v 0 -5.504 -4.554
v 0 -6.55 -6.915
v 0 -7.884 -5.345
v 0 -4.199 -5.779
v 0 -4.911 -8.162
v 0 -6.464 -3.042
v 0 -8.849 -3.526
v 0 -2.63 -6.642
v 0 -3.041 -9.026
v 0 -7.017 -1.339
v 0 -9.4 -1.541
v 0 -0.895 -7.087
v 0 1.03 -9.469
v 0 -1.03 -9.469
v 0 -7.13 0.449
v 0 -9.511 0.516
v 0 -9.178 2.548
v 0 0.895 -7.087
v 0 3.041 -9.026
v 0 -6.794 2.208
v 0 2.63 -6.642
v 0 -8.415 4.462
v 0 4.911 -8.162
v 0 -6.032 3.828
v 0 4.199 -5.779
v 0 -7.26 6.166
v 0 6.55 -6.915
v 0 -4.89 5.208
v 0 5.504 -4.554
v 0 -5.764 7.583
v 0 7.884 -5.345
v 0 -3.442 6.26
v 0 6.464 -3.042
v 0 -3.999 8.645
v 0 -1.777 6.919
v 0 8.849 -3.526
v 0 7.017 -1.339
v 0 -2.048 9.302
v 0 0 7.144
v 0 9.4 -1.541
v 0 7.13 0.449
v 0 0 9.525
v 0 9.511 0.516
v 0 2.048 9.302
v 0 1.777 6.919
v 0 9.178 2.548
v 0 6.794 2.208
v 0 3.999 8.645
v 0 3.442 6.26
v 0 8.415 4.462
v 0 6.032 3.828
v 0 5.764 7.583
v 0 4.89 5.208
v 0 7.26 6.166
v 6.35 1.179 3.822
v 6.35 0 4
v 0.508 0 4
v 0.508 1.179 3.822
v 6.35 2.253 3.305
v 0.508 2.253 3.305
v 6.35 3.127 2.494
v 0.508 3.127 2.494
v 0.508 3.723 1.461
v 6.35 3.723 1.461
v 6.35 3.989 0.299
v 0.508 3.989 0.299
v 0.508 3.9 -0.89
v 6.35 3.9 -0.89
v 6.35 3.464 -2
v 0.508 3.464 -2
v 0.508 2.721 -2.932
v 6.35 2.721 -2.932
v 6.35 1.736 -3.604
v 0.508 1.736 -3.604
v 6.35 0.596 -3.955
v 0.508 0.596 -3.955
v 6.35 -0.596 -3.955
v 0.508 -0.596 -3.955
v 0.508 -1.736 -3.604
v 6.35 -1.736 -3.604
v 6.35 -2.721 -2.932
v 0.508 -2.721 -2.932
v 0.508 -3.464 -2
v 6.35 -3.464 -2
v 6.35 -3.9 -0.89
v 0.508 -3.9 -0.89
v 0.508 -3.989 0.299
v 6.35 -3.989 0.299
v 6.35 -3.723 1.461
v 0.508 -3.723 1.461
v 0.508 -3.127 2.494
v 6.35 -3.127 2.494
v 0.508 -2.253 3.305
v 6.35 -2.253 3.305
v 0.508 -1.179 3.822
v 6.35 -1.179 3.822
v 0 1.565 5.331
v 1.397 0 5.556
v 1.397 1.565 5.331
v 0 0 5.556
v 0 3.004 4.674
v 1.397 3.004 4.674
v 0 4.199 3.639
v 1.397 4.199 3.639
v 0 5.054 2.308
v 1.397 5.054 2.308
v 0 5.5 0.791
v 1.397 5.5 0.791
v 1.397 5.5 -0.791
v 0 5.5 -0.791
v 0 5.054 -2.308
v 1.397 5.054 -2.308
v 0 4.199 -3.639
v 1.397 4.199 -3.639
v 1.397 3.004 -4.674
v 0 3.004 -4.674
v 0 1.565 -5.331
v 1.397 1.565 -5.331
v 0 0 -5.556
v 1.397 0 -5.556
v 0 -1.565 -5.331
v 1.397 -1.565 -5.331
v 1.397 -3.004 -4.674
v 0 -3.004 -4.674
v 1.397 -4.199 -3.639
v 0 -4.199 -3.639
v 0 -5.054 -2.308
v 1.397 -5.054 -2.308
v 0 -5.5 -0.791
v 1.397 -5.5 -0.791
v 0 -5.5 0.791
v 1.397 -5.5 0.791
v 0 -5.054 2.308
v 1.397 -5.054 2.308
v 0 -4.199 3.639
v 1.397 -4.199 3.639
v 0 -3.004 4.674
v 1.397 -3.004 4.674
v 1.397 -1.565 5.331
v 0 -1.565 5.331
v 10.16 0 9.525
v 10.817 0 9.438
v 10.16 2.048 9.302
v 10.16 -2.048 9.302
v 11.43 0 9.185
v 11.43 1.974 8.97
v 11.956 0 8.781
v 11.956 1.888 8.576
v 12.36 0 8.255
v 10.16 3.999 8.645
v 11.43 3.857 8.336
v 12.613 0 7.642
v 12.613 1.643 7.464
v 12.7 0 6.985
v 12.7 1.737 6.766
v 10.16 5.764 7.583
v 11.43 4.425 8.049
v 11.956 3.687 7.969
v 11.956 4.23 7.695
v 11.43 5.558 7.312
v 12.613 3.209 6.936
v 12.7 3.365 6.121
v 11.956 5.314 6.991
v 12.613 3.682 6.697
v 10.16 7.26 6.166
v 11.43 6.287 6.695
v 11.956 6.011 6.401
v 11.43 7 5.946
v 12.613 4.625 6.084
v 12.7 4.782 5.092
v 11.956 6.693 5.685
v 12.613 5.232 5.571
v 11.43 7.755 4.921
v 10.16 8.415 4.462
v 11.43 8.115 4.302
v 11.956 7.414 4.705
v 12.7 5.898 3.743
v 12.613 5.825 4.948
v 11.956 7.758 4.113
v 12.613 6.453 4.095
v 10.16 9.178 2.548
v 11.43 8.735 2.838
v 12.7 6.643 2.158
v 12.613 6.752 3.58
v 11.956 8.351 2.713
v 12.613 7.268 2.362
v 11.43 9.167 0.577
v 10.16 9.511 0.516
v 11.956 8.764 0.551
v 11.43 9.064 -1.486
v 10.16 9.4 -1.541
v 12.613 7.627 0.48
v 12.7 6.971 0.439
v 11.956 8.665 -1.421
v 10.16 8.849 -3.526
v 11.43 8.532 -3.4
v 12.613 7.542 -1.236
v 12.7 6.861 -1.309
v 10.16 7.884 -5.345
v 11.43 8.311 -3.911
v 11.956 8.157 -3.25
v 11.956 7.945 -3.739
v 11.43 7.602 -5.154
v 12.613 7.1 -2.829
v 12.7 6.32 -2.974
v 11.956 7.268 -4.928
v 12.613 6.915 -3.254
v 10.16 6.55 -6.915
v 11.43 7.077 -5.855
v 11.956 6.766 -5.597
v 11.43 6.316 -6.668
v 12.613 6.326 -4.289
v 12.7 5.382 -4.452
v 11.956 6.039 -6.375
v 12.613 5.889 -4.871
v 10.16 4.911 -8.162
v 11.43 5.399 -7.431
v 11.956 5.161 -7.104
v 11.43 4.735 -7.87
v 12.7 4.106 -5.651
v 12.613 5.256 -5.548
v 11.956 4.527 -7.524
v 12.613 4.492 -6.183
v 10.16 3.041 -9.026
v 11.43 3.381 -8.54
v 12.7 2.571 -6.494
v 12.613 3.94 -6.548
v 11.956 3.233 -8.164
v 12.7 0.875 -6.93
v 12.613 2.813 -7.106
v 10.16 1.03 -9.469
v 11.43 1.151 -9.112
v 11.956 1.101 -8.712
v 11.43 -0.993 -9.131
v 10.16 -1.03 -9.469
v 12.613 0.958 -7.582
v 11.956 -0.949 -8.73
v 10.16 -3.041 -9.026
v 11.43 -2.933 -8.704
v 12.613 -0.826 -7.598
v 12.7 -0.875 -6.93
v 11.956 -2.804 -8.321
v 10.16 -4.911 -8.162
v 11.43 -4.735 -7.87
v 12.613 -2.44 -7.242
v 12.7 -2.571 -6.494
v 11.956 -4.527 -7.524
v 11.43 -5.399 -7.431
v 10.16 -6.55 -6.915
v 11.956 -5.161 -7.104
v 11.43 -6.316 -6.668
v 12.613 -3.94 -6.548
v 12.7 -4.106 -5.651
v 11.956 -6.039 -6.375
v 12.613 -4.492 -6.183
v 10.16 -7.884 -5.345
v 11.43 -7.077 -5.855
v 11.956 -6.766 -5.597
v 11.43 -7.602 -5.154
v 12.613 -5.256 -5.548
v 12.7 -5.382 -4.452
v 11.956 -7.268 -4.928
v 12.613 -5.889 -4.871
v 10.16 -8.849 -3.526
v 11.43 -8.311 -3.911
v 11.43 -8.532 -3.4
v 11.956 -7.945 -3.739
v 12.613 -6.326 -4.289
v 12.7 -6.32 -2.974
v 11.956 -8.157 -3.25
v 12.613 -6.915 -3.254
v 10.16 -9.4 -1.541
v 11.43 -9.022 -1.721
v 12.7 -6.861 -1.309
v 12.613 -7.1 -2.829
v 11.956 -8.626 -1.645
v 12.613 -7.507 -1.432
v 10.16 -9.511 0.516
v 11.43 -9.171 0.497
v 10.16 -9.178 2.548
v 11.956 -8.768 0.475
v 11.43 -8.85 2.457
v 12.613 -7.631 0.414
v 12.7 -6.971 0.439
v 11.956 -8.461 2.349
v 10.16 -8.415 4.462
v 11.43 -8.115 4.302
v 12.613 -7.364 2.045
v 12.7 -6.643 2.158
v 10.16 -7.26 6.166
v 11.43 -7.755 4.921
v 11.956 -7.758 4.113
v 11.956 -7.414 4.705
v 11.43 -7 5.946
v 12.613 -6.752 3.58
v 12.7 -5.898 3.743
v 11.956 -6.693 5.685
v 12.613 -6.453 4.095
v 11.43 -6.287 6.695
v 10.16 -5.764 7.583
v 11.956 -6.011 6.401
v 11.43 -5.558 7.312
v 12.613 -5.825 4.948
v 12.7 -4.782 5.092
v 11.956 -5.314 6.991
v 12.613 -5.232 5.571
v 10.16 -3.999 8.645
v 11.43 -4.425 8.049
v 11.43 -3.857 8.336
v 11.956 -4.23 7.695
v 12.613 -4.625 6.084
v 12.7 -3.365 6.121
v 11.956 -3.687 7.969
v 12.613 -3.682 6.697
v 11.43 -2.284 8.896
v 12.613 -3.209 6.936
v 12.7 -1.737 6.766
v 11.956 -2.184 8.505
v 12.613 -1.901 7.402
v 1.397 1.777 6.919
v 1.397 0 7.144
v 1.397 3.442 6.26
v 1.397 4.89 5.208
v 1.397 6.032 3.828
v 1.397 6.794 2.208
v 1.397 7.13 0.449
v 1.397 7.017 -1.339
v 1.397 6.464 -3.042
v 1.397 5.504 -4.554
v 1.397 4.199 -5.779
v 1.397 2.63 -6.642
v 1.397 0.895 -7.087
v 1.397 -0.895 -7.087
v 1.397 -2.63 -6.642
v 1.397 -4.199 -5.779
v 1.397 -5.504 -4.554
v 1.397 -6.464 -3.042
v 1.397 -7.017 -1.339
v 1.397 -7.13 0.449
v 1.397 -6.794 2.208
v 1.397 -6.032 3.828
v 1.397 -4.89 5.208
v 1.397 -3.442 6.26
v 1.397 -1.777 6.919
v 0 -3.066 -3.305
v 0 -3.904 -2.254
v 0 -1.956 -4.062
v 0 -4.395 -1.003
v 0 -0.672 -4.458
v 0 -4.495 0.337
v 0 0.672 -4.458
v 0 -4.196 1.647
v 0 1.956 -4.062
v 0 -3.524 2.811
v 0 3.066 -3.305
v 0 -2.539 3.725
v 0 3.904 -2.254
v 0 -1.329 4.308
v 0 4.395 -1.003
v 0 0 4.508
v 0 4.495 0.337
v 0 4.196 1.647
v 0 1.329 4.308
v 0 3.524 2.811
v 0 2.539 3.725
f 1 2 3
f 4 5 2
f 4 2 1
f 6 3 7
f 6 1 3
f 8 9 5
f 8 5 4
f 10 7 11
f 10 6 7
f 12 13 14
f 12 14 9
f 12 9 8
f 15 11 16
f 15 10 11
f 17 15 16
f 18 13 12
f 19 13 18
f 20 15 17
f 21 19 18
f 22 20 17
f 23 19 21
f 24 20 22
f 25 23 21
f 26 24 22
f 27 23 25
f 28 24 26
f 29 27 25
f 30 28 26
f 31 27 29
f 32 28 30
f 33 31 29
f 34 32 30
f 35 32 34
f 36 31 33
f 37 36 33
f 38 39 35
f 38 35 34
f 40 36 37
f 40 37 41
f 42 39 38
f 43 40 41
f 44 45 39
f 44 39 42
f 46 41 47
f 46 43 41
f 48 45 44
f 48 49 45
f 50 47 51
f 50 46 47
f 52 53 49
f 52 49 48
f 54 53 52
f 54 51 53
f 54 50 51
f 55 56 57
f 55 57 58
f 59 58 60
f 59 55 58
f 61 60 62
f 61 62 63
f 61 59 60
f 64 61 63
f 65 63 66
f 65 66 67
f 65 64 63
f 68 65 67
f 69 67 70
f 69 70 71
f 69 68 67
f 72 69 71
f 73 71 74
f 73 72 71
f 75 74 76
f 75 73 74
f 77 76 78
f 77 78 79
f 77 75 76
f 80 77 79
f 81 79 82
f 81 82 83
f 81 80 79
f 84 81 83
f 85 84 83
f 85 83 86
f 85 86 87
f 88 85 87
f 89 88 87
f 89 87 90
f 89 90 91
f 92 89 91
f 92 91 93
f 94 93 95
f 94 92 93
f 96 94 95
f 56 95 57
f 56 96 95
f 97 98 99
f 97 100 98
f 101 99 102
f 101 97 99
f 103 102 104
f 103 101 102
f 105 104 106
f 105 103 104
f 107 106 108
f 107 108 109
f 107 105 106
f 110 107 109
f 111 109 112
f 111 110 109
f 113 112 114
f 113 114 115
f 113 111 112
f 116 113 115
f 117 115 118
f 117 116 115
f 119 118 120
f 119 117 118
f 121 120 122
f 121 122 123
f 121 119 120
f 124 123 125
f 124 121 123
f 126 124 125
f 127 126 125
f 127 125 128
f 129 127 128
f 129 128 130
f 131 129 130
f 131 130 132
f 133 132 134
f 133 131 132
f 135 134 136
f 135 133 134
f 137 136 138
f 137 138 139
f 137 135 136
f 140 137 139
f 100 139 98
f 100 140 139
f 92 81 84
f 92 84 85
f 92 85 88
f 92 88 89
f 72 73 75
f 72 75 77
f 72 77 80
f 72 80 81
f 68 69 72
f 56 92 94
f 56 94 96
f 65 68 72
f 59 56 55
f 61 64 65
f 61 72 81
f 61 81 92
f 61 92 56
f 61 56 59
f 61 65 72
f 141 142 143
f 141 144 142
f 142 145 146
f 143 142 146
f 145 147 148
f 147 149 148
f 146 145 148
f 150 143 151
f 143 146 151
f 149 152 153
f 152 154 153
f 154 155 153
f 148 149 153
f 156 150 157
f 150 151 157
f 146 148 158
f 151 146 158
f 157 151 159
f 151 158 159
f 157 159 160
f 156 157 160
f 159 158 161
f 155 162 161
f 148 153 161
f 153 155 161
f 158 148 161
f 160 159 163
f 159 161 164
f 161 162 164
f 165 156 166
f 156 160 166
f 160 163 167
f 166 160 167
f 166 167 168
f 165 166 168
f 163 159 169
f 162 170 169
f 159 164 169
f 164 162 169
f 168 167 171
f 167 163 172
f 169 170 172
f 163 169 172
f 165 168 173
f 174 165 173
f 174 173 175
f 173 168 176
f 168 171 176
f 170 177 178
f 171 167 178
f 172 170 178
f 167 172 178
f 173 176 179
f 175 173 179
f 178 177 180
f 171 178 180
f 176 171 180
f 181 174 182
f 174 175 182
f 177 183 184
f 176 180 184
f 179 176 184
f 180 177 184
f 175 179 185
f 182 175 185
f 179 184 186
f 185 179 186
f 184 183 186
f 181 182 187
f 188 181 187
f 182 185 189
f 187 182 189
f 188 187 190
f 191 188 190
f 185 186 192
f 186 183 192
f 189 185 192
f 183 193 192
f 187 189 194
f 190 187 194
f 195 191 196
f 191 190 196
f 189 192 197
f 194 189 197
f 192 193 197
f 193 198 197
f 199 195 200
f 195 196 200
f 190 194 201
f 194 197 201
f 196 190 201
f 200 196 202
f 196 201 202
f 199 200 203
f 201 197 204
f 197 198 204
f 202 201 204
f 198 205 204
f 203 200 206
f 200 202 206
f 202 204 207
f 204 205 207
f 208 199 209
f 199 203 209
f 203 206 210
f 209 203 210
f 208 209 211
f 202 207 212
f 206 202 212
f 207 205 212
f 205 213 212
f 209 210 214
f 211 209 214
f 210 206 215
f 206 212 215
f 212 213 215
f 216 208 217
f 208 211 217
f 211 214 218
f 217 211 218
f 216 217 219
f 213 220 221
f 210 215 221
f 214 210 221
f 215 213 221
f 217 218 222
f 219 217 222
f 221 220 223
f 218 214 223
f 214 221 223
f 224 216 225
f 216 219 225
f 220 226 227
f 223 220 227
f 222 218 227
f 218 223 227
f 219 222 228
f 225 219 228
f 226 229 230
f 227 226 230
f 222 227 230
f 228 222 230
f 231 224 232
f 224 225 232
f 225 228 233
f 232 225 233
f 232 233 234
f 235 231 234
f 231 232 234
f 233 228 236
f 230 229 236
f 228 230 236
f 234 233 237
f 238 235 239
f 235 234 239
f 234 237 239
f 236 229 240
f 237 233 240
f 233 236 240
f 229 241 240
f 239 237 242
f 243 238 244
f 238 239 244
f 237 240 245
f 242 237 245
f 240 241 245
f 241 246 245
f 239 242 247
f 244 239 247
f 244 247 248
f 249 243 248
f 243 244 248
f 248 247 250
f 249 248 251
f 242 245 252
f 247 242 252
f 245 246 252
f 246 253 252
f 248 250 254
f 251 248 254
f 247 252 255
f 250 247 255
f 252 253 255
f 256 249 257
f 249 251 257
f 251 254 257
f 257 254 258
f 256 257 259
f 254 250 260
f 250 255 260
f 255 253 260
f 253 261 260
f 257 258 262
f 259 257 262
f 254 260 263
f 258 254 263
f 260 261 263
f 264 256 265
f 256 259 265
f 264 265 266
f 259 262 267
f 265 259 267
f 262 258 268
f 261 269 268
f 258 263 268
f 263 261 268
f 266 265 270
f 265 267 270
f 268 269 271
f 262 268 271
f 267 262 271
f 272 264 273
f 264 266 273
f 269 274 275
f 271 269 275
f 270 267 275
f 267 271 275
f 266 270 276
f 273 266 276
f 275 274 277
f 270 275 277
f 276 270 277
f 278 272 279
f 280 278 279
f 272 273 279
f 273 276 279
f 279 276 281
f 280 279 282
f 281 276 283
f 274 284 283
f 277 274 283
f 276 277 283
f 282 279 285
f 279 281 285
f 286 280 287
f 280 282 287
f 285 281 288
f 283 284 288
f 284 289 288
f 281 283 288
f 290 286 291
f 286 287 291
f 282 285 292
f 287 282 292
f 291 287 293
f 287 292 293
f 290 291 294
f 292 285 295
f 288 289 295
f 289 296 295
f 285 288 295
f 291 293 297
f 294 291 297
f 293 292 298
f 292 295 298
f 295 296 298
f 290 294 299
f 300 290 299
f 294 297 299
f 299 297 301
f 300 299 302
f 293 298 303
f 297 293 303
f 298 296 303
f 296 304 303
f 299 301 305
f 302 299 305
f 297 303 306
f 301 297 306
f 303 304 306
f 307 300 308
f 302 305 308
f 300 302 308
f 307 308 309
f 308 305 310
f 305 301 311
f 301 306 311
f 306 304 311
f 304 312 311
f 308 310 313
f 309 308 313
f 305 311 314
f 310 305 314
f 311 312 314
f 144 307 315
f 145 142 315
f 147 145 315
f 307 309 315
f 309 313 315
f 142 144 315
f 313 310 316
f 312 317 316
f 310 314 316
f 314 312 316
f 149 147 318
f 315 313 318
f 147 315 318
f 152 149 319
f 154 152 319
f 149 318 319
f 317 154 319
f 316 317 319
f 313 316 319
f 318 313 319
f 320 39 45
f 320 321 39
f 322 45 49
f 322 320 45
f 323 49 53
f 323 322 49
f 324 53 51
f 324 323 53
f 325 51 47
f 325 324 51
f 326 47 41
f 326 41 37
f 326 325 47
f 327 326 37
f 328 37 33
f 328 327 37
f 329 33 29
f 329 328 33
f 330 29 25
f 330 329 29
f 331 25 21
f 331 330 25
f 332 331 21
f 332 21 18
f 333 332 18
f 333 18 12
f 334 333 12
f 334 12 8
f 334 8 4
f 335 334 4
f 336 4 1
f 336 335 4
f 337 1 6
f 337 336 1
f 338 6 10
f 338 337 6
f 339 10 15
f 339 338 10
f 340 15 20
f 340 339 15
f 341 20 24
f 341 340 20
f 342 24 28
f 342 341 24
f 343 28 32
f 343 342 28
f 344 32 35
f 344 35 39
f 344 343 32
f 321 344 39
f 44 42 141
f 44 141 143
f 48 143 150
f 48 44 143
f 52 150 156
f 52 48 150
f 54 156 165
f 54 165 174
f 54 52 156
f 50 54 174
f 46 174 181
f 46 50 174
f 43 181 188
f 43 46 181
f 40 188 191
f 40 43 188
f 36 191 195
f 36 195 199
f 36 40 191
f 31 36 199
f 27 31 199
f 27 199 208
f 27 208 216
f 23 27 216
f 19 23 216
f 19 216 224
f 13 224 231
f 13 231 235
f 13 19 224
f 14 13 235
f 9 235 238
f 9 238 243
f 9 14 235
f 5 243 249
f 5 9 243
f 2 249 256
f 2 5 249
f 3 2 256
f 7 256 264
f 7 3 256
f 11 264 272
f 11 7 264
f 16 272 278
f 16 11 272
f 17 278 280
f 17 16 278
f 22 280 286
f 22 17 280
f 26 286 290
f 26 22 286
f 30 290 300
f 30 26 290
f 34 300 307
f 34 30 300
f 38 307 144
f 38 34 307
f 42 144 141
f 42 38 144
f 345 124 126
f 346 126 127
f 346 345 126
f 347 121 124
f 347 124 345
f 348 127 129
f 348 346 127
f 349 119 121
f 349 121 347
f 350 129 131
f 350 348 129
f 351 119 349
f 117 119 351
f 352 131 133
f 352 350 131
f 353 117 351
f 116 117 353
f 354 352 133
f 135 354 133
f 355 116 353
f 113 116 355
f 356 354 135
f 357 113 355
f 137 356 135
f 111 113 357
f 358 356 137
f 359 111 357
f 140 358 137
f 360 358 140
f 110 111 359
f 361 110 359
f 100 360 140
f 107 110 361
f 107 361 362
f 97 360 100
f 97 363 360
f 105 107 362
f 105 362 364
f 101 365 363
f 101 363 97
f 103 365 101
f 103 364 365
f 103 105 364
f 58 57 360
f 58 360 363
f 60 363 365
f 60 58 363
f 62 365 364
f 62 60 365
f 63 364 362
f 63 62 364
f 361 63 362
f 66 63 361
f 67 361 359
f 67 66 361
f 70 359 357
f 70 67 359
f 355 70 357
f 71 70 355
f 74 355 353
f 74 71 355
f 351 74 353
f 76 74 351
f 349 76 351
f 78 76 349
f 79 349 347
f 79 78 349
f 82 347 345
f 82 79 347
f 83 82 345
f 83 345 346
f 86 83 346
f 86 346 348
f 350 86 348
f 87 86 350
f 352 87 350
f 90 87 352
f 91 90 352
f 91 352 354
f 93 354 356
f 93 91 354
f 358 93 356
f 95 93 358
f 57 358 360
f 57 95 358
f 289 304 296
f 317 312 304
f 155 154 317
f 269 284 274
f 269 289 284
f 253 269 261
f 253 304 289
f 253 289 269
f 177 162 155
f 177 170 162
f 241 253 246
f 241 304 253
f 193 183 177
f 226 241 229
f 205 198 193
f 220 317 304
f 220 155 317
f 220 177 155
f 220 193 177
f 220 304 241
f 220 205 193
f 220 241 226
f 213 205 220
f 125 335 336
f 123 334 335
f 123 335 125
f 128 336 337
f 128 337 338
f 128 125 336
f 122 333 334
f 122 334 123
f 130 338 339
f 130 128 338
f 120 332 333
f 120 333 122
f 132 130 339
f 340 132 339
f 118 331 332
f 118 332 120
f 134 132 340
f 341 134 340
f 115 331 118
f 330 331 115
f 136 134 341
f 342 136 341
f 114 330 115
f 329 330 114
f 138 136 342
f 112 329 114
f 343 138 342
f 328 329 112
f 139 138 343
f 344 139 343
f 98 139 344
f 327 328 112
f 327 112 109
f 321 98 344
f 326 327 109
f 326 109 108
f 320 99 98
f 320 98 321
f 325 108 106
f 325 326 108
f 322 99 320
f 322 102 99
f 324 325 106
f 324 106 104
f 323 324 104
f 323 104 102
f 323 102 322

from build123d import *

# Parameters (mm, degrees)
F2_SIZE = 0.508
F3_R    = 2.54


with BuildPart() as f1:
    # F0 (on Front) → F1 (revolve)
    with BuildSketch(Plane.XZ):
        Polygon((0, 5.55625), (0, 4), (6.35, 4), (6.35, 0), (12.7, 0), (12.7, 9.525), (0, 9.525), (0, 7.14375), (1.397, 7.14375), (1.397, 5.55625), align=None)
    revolve(axis=Axis((9.525, 0, 0), (-1, 0, 0)))

    # F2
    f2_edges = [f1.edges().sort_by_distance(p)[0] for p in [
        (0, 0, -4),
    ]]
    chamfer(f2_edges, length=F2_SIZE)

    # F3
    f3_edges = [f1.edges().sort_by_distance(p)[0] for p in [
        (12.7, 0, -9.525),
    ]]
    fillet(f3_edges, radius=F3_R)


solid = f1.part
